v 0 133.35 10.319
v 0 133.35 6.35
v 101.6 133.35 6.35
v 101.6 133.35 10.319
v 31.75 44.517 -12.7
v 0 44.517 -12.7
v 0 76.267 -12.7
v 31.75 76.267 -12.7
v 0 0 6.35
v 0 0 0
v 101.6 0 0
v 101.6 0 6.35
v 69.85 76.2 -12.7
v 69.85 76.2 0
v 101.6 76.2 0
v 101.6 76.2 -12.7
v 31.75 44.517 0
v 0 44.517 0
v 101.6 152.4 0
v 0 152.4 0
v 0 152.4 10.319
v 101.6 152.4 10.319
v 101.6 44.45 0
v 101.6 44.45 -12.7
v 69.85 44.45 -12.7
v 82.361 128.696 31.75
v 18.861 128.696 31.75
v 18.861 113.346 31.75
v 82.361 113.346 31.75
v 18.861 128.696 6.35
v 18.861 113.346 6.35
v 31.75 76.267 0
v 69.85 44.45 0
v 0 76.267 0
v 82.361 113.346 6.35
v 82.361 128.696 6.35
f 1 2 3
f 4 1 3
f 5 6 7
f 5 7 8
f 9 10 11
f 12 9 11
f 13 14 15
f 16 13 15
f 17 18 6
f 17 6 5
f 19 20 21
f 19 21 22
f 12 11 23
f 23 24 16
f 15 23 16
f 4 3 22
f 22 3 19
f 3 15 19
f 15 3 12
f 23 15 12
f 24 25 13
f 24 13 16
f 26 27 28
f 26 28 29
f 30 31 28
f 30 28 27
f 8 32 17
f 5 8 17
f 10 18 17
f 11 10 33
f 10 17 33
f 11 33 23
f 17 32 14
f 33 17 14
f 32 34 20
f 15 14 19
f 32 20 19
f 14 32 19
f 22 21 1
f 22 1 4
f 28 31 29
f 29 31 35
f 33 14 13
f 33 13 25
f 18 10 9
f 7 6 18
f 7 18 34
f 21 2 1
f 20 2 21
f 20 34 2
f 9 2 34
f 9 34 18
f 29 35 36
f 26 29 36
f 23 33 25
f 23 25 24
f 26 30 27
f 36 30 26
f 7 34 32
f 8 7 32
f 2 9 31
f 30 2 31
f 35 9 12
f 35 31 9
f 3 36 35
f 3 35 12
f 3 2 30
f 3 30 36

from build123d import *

# Parameters (mm, degrees)
F0_W     = 101.6
F0_H     = 152.4
F1_DEPTH = 6.35
F2_W     = 63.5
F2_H     = 15.3497201503
F3_DEPTH = 25.4
F4_W     = 101.6
F4_H     = 19.05
F5_DEPTH = 3.96875
F6_W     = 31.75
F6_H     = 31.75
F7_DEPTH = 12.7
F8_W     = 31.75
F8_H     = 31.75
F9_DEPTH = 12.7


# Not quite as in the source:
# - a length typed as a fraction of an inch, garbled in the dataset ("3 / 203.2 mm" for 3/8 in), is restored


with BuildPart() as f1:
    # F0 (on Top) → F1 (new body)
    with BuildSketch(Plane.XY):
        with Locations((50.8, 76.2)):
            Rectangle(F0_W, F0_H)
    extrude(amount=F1_DEPTH)

    # F2 (on face) → F3 (join)
    with BuildSketch(Plane.XY.offset(6.35)):
        with Locations((50.6108440459, 121.0213452578)):
            Rectangle(F2_W, F2_H)
    extrude(amount=F3_DEPTH)

    # F4 (on face) → F5 (join)
    with BuildSketch(Plane.XY.offset(6.35)):
        with Locations((50.8, 142.875)):
            Rectangle(F4_W, F4_H)
    extrude(amount=F5_DEPTH)

    # F6 (on face) → F7 (join)
    with BuildSketch(Plane(origin=(0, 0, 0), x_dir=(1, 0, 0), z_dir=(0, 0, -1))):
        with Locations((15.875, -60.3918848038)):
            Rectangle(F6_W, F6_H)
    extrude(amount=F7_DEPTH)

    # F8 (on face) → F9 (join)
    with BuildSketch(Plane(origin=(0, 0, 0), x_dir=(1, 0, 0), z_dir=(0, 0, -1))):
        with Locations((85.725, -60.325)):
            Rectangle(F8_W, F8_H)
    extrude(amount=F9_DEPTH)


solid = f1.part
